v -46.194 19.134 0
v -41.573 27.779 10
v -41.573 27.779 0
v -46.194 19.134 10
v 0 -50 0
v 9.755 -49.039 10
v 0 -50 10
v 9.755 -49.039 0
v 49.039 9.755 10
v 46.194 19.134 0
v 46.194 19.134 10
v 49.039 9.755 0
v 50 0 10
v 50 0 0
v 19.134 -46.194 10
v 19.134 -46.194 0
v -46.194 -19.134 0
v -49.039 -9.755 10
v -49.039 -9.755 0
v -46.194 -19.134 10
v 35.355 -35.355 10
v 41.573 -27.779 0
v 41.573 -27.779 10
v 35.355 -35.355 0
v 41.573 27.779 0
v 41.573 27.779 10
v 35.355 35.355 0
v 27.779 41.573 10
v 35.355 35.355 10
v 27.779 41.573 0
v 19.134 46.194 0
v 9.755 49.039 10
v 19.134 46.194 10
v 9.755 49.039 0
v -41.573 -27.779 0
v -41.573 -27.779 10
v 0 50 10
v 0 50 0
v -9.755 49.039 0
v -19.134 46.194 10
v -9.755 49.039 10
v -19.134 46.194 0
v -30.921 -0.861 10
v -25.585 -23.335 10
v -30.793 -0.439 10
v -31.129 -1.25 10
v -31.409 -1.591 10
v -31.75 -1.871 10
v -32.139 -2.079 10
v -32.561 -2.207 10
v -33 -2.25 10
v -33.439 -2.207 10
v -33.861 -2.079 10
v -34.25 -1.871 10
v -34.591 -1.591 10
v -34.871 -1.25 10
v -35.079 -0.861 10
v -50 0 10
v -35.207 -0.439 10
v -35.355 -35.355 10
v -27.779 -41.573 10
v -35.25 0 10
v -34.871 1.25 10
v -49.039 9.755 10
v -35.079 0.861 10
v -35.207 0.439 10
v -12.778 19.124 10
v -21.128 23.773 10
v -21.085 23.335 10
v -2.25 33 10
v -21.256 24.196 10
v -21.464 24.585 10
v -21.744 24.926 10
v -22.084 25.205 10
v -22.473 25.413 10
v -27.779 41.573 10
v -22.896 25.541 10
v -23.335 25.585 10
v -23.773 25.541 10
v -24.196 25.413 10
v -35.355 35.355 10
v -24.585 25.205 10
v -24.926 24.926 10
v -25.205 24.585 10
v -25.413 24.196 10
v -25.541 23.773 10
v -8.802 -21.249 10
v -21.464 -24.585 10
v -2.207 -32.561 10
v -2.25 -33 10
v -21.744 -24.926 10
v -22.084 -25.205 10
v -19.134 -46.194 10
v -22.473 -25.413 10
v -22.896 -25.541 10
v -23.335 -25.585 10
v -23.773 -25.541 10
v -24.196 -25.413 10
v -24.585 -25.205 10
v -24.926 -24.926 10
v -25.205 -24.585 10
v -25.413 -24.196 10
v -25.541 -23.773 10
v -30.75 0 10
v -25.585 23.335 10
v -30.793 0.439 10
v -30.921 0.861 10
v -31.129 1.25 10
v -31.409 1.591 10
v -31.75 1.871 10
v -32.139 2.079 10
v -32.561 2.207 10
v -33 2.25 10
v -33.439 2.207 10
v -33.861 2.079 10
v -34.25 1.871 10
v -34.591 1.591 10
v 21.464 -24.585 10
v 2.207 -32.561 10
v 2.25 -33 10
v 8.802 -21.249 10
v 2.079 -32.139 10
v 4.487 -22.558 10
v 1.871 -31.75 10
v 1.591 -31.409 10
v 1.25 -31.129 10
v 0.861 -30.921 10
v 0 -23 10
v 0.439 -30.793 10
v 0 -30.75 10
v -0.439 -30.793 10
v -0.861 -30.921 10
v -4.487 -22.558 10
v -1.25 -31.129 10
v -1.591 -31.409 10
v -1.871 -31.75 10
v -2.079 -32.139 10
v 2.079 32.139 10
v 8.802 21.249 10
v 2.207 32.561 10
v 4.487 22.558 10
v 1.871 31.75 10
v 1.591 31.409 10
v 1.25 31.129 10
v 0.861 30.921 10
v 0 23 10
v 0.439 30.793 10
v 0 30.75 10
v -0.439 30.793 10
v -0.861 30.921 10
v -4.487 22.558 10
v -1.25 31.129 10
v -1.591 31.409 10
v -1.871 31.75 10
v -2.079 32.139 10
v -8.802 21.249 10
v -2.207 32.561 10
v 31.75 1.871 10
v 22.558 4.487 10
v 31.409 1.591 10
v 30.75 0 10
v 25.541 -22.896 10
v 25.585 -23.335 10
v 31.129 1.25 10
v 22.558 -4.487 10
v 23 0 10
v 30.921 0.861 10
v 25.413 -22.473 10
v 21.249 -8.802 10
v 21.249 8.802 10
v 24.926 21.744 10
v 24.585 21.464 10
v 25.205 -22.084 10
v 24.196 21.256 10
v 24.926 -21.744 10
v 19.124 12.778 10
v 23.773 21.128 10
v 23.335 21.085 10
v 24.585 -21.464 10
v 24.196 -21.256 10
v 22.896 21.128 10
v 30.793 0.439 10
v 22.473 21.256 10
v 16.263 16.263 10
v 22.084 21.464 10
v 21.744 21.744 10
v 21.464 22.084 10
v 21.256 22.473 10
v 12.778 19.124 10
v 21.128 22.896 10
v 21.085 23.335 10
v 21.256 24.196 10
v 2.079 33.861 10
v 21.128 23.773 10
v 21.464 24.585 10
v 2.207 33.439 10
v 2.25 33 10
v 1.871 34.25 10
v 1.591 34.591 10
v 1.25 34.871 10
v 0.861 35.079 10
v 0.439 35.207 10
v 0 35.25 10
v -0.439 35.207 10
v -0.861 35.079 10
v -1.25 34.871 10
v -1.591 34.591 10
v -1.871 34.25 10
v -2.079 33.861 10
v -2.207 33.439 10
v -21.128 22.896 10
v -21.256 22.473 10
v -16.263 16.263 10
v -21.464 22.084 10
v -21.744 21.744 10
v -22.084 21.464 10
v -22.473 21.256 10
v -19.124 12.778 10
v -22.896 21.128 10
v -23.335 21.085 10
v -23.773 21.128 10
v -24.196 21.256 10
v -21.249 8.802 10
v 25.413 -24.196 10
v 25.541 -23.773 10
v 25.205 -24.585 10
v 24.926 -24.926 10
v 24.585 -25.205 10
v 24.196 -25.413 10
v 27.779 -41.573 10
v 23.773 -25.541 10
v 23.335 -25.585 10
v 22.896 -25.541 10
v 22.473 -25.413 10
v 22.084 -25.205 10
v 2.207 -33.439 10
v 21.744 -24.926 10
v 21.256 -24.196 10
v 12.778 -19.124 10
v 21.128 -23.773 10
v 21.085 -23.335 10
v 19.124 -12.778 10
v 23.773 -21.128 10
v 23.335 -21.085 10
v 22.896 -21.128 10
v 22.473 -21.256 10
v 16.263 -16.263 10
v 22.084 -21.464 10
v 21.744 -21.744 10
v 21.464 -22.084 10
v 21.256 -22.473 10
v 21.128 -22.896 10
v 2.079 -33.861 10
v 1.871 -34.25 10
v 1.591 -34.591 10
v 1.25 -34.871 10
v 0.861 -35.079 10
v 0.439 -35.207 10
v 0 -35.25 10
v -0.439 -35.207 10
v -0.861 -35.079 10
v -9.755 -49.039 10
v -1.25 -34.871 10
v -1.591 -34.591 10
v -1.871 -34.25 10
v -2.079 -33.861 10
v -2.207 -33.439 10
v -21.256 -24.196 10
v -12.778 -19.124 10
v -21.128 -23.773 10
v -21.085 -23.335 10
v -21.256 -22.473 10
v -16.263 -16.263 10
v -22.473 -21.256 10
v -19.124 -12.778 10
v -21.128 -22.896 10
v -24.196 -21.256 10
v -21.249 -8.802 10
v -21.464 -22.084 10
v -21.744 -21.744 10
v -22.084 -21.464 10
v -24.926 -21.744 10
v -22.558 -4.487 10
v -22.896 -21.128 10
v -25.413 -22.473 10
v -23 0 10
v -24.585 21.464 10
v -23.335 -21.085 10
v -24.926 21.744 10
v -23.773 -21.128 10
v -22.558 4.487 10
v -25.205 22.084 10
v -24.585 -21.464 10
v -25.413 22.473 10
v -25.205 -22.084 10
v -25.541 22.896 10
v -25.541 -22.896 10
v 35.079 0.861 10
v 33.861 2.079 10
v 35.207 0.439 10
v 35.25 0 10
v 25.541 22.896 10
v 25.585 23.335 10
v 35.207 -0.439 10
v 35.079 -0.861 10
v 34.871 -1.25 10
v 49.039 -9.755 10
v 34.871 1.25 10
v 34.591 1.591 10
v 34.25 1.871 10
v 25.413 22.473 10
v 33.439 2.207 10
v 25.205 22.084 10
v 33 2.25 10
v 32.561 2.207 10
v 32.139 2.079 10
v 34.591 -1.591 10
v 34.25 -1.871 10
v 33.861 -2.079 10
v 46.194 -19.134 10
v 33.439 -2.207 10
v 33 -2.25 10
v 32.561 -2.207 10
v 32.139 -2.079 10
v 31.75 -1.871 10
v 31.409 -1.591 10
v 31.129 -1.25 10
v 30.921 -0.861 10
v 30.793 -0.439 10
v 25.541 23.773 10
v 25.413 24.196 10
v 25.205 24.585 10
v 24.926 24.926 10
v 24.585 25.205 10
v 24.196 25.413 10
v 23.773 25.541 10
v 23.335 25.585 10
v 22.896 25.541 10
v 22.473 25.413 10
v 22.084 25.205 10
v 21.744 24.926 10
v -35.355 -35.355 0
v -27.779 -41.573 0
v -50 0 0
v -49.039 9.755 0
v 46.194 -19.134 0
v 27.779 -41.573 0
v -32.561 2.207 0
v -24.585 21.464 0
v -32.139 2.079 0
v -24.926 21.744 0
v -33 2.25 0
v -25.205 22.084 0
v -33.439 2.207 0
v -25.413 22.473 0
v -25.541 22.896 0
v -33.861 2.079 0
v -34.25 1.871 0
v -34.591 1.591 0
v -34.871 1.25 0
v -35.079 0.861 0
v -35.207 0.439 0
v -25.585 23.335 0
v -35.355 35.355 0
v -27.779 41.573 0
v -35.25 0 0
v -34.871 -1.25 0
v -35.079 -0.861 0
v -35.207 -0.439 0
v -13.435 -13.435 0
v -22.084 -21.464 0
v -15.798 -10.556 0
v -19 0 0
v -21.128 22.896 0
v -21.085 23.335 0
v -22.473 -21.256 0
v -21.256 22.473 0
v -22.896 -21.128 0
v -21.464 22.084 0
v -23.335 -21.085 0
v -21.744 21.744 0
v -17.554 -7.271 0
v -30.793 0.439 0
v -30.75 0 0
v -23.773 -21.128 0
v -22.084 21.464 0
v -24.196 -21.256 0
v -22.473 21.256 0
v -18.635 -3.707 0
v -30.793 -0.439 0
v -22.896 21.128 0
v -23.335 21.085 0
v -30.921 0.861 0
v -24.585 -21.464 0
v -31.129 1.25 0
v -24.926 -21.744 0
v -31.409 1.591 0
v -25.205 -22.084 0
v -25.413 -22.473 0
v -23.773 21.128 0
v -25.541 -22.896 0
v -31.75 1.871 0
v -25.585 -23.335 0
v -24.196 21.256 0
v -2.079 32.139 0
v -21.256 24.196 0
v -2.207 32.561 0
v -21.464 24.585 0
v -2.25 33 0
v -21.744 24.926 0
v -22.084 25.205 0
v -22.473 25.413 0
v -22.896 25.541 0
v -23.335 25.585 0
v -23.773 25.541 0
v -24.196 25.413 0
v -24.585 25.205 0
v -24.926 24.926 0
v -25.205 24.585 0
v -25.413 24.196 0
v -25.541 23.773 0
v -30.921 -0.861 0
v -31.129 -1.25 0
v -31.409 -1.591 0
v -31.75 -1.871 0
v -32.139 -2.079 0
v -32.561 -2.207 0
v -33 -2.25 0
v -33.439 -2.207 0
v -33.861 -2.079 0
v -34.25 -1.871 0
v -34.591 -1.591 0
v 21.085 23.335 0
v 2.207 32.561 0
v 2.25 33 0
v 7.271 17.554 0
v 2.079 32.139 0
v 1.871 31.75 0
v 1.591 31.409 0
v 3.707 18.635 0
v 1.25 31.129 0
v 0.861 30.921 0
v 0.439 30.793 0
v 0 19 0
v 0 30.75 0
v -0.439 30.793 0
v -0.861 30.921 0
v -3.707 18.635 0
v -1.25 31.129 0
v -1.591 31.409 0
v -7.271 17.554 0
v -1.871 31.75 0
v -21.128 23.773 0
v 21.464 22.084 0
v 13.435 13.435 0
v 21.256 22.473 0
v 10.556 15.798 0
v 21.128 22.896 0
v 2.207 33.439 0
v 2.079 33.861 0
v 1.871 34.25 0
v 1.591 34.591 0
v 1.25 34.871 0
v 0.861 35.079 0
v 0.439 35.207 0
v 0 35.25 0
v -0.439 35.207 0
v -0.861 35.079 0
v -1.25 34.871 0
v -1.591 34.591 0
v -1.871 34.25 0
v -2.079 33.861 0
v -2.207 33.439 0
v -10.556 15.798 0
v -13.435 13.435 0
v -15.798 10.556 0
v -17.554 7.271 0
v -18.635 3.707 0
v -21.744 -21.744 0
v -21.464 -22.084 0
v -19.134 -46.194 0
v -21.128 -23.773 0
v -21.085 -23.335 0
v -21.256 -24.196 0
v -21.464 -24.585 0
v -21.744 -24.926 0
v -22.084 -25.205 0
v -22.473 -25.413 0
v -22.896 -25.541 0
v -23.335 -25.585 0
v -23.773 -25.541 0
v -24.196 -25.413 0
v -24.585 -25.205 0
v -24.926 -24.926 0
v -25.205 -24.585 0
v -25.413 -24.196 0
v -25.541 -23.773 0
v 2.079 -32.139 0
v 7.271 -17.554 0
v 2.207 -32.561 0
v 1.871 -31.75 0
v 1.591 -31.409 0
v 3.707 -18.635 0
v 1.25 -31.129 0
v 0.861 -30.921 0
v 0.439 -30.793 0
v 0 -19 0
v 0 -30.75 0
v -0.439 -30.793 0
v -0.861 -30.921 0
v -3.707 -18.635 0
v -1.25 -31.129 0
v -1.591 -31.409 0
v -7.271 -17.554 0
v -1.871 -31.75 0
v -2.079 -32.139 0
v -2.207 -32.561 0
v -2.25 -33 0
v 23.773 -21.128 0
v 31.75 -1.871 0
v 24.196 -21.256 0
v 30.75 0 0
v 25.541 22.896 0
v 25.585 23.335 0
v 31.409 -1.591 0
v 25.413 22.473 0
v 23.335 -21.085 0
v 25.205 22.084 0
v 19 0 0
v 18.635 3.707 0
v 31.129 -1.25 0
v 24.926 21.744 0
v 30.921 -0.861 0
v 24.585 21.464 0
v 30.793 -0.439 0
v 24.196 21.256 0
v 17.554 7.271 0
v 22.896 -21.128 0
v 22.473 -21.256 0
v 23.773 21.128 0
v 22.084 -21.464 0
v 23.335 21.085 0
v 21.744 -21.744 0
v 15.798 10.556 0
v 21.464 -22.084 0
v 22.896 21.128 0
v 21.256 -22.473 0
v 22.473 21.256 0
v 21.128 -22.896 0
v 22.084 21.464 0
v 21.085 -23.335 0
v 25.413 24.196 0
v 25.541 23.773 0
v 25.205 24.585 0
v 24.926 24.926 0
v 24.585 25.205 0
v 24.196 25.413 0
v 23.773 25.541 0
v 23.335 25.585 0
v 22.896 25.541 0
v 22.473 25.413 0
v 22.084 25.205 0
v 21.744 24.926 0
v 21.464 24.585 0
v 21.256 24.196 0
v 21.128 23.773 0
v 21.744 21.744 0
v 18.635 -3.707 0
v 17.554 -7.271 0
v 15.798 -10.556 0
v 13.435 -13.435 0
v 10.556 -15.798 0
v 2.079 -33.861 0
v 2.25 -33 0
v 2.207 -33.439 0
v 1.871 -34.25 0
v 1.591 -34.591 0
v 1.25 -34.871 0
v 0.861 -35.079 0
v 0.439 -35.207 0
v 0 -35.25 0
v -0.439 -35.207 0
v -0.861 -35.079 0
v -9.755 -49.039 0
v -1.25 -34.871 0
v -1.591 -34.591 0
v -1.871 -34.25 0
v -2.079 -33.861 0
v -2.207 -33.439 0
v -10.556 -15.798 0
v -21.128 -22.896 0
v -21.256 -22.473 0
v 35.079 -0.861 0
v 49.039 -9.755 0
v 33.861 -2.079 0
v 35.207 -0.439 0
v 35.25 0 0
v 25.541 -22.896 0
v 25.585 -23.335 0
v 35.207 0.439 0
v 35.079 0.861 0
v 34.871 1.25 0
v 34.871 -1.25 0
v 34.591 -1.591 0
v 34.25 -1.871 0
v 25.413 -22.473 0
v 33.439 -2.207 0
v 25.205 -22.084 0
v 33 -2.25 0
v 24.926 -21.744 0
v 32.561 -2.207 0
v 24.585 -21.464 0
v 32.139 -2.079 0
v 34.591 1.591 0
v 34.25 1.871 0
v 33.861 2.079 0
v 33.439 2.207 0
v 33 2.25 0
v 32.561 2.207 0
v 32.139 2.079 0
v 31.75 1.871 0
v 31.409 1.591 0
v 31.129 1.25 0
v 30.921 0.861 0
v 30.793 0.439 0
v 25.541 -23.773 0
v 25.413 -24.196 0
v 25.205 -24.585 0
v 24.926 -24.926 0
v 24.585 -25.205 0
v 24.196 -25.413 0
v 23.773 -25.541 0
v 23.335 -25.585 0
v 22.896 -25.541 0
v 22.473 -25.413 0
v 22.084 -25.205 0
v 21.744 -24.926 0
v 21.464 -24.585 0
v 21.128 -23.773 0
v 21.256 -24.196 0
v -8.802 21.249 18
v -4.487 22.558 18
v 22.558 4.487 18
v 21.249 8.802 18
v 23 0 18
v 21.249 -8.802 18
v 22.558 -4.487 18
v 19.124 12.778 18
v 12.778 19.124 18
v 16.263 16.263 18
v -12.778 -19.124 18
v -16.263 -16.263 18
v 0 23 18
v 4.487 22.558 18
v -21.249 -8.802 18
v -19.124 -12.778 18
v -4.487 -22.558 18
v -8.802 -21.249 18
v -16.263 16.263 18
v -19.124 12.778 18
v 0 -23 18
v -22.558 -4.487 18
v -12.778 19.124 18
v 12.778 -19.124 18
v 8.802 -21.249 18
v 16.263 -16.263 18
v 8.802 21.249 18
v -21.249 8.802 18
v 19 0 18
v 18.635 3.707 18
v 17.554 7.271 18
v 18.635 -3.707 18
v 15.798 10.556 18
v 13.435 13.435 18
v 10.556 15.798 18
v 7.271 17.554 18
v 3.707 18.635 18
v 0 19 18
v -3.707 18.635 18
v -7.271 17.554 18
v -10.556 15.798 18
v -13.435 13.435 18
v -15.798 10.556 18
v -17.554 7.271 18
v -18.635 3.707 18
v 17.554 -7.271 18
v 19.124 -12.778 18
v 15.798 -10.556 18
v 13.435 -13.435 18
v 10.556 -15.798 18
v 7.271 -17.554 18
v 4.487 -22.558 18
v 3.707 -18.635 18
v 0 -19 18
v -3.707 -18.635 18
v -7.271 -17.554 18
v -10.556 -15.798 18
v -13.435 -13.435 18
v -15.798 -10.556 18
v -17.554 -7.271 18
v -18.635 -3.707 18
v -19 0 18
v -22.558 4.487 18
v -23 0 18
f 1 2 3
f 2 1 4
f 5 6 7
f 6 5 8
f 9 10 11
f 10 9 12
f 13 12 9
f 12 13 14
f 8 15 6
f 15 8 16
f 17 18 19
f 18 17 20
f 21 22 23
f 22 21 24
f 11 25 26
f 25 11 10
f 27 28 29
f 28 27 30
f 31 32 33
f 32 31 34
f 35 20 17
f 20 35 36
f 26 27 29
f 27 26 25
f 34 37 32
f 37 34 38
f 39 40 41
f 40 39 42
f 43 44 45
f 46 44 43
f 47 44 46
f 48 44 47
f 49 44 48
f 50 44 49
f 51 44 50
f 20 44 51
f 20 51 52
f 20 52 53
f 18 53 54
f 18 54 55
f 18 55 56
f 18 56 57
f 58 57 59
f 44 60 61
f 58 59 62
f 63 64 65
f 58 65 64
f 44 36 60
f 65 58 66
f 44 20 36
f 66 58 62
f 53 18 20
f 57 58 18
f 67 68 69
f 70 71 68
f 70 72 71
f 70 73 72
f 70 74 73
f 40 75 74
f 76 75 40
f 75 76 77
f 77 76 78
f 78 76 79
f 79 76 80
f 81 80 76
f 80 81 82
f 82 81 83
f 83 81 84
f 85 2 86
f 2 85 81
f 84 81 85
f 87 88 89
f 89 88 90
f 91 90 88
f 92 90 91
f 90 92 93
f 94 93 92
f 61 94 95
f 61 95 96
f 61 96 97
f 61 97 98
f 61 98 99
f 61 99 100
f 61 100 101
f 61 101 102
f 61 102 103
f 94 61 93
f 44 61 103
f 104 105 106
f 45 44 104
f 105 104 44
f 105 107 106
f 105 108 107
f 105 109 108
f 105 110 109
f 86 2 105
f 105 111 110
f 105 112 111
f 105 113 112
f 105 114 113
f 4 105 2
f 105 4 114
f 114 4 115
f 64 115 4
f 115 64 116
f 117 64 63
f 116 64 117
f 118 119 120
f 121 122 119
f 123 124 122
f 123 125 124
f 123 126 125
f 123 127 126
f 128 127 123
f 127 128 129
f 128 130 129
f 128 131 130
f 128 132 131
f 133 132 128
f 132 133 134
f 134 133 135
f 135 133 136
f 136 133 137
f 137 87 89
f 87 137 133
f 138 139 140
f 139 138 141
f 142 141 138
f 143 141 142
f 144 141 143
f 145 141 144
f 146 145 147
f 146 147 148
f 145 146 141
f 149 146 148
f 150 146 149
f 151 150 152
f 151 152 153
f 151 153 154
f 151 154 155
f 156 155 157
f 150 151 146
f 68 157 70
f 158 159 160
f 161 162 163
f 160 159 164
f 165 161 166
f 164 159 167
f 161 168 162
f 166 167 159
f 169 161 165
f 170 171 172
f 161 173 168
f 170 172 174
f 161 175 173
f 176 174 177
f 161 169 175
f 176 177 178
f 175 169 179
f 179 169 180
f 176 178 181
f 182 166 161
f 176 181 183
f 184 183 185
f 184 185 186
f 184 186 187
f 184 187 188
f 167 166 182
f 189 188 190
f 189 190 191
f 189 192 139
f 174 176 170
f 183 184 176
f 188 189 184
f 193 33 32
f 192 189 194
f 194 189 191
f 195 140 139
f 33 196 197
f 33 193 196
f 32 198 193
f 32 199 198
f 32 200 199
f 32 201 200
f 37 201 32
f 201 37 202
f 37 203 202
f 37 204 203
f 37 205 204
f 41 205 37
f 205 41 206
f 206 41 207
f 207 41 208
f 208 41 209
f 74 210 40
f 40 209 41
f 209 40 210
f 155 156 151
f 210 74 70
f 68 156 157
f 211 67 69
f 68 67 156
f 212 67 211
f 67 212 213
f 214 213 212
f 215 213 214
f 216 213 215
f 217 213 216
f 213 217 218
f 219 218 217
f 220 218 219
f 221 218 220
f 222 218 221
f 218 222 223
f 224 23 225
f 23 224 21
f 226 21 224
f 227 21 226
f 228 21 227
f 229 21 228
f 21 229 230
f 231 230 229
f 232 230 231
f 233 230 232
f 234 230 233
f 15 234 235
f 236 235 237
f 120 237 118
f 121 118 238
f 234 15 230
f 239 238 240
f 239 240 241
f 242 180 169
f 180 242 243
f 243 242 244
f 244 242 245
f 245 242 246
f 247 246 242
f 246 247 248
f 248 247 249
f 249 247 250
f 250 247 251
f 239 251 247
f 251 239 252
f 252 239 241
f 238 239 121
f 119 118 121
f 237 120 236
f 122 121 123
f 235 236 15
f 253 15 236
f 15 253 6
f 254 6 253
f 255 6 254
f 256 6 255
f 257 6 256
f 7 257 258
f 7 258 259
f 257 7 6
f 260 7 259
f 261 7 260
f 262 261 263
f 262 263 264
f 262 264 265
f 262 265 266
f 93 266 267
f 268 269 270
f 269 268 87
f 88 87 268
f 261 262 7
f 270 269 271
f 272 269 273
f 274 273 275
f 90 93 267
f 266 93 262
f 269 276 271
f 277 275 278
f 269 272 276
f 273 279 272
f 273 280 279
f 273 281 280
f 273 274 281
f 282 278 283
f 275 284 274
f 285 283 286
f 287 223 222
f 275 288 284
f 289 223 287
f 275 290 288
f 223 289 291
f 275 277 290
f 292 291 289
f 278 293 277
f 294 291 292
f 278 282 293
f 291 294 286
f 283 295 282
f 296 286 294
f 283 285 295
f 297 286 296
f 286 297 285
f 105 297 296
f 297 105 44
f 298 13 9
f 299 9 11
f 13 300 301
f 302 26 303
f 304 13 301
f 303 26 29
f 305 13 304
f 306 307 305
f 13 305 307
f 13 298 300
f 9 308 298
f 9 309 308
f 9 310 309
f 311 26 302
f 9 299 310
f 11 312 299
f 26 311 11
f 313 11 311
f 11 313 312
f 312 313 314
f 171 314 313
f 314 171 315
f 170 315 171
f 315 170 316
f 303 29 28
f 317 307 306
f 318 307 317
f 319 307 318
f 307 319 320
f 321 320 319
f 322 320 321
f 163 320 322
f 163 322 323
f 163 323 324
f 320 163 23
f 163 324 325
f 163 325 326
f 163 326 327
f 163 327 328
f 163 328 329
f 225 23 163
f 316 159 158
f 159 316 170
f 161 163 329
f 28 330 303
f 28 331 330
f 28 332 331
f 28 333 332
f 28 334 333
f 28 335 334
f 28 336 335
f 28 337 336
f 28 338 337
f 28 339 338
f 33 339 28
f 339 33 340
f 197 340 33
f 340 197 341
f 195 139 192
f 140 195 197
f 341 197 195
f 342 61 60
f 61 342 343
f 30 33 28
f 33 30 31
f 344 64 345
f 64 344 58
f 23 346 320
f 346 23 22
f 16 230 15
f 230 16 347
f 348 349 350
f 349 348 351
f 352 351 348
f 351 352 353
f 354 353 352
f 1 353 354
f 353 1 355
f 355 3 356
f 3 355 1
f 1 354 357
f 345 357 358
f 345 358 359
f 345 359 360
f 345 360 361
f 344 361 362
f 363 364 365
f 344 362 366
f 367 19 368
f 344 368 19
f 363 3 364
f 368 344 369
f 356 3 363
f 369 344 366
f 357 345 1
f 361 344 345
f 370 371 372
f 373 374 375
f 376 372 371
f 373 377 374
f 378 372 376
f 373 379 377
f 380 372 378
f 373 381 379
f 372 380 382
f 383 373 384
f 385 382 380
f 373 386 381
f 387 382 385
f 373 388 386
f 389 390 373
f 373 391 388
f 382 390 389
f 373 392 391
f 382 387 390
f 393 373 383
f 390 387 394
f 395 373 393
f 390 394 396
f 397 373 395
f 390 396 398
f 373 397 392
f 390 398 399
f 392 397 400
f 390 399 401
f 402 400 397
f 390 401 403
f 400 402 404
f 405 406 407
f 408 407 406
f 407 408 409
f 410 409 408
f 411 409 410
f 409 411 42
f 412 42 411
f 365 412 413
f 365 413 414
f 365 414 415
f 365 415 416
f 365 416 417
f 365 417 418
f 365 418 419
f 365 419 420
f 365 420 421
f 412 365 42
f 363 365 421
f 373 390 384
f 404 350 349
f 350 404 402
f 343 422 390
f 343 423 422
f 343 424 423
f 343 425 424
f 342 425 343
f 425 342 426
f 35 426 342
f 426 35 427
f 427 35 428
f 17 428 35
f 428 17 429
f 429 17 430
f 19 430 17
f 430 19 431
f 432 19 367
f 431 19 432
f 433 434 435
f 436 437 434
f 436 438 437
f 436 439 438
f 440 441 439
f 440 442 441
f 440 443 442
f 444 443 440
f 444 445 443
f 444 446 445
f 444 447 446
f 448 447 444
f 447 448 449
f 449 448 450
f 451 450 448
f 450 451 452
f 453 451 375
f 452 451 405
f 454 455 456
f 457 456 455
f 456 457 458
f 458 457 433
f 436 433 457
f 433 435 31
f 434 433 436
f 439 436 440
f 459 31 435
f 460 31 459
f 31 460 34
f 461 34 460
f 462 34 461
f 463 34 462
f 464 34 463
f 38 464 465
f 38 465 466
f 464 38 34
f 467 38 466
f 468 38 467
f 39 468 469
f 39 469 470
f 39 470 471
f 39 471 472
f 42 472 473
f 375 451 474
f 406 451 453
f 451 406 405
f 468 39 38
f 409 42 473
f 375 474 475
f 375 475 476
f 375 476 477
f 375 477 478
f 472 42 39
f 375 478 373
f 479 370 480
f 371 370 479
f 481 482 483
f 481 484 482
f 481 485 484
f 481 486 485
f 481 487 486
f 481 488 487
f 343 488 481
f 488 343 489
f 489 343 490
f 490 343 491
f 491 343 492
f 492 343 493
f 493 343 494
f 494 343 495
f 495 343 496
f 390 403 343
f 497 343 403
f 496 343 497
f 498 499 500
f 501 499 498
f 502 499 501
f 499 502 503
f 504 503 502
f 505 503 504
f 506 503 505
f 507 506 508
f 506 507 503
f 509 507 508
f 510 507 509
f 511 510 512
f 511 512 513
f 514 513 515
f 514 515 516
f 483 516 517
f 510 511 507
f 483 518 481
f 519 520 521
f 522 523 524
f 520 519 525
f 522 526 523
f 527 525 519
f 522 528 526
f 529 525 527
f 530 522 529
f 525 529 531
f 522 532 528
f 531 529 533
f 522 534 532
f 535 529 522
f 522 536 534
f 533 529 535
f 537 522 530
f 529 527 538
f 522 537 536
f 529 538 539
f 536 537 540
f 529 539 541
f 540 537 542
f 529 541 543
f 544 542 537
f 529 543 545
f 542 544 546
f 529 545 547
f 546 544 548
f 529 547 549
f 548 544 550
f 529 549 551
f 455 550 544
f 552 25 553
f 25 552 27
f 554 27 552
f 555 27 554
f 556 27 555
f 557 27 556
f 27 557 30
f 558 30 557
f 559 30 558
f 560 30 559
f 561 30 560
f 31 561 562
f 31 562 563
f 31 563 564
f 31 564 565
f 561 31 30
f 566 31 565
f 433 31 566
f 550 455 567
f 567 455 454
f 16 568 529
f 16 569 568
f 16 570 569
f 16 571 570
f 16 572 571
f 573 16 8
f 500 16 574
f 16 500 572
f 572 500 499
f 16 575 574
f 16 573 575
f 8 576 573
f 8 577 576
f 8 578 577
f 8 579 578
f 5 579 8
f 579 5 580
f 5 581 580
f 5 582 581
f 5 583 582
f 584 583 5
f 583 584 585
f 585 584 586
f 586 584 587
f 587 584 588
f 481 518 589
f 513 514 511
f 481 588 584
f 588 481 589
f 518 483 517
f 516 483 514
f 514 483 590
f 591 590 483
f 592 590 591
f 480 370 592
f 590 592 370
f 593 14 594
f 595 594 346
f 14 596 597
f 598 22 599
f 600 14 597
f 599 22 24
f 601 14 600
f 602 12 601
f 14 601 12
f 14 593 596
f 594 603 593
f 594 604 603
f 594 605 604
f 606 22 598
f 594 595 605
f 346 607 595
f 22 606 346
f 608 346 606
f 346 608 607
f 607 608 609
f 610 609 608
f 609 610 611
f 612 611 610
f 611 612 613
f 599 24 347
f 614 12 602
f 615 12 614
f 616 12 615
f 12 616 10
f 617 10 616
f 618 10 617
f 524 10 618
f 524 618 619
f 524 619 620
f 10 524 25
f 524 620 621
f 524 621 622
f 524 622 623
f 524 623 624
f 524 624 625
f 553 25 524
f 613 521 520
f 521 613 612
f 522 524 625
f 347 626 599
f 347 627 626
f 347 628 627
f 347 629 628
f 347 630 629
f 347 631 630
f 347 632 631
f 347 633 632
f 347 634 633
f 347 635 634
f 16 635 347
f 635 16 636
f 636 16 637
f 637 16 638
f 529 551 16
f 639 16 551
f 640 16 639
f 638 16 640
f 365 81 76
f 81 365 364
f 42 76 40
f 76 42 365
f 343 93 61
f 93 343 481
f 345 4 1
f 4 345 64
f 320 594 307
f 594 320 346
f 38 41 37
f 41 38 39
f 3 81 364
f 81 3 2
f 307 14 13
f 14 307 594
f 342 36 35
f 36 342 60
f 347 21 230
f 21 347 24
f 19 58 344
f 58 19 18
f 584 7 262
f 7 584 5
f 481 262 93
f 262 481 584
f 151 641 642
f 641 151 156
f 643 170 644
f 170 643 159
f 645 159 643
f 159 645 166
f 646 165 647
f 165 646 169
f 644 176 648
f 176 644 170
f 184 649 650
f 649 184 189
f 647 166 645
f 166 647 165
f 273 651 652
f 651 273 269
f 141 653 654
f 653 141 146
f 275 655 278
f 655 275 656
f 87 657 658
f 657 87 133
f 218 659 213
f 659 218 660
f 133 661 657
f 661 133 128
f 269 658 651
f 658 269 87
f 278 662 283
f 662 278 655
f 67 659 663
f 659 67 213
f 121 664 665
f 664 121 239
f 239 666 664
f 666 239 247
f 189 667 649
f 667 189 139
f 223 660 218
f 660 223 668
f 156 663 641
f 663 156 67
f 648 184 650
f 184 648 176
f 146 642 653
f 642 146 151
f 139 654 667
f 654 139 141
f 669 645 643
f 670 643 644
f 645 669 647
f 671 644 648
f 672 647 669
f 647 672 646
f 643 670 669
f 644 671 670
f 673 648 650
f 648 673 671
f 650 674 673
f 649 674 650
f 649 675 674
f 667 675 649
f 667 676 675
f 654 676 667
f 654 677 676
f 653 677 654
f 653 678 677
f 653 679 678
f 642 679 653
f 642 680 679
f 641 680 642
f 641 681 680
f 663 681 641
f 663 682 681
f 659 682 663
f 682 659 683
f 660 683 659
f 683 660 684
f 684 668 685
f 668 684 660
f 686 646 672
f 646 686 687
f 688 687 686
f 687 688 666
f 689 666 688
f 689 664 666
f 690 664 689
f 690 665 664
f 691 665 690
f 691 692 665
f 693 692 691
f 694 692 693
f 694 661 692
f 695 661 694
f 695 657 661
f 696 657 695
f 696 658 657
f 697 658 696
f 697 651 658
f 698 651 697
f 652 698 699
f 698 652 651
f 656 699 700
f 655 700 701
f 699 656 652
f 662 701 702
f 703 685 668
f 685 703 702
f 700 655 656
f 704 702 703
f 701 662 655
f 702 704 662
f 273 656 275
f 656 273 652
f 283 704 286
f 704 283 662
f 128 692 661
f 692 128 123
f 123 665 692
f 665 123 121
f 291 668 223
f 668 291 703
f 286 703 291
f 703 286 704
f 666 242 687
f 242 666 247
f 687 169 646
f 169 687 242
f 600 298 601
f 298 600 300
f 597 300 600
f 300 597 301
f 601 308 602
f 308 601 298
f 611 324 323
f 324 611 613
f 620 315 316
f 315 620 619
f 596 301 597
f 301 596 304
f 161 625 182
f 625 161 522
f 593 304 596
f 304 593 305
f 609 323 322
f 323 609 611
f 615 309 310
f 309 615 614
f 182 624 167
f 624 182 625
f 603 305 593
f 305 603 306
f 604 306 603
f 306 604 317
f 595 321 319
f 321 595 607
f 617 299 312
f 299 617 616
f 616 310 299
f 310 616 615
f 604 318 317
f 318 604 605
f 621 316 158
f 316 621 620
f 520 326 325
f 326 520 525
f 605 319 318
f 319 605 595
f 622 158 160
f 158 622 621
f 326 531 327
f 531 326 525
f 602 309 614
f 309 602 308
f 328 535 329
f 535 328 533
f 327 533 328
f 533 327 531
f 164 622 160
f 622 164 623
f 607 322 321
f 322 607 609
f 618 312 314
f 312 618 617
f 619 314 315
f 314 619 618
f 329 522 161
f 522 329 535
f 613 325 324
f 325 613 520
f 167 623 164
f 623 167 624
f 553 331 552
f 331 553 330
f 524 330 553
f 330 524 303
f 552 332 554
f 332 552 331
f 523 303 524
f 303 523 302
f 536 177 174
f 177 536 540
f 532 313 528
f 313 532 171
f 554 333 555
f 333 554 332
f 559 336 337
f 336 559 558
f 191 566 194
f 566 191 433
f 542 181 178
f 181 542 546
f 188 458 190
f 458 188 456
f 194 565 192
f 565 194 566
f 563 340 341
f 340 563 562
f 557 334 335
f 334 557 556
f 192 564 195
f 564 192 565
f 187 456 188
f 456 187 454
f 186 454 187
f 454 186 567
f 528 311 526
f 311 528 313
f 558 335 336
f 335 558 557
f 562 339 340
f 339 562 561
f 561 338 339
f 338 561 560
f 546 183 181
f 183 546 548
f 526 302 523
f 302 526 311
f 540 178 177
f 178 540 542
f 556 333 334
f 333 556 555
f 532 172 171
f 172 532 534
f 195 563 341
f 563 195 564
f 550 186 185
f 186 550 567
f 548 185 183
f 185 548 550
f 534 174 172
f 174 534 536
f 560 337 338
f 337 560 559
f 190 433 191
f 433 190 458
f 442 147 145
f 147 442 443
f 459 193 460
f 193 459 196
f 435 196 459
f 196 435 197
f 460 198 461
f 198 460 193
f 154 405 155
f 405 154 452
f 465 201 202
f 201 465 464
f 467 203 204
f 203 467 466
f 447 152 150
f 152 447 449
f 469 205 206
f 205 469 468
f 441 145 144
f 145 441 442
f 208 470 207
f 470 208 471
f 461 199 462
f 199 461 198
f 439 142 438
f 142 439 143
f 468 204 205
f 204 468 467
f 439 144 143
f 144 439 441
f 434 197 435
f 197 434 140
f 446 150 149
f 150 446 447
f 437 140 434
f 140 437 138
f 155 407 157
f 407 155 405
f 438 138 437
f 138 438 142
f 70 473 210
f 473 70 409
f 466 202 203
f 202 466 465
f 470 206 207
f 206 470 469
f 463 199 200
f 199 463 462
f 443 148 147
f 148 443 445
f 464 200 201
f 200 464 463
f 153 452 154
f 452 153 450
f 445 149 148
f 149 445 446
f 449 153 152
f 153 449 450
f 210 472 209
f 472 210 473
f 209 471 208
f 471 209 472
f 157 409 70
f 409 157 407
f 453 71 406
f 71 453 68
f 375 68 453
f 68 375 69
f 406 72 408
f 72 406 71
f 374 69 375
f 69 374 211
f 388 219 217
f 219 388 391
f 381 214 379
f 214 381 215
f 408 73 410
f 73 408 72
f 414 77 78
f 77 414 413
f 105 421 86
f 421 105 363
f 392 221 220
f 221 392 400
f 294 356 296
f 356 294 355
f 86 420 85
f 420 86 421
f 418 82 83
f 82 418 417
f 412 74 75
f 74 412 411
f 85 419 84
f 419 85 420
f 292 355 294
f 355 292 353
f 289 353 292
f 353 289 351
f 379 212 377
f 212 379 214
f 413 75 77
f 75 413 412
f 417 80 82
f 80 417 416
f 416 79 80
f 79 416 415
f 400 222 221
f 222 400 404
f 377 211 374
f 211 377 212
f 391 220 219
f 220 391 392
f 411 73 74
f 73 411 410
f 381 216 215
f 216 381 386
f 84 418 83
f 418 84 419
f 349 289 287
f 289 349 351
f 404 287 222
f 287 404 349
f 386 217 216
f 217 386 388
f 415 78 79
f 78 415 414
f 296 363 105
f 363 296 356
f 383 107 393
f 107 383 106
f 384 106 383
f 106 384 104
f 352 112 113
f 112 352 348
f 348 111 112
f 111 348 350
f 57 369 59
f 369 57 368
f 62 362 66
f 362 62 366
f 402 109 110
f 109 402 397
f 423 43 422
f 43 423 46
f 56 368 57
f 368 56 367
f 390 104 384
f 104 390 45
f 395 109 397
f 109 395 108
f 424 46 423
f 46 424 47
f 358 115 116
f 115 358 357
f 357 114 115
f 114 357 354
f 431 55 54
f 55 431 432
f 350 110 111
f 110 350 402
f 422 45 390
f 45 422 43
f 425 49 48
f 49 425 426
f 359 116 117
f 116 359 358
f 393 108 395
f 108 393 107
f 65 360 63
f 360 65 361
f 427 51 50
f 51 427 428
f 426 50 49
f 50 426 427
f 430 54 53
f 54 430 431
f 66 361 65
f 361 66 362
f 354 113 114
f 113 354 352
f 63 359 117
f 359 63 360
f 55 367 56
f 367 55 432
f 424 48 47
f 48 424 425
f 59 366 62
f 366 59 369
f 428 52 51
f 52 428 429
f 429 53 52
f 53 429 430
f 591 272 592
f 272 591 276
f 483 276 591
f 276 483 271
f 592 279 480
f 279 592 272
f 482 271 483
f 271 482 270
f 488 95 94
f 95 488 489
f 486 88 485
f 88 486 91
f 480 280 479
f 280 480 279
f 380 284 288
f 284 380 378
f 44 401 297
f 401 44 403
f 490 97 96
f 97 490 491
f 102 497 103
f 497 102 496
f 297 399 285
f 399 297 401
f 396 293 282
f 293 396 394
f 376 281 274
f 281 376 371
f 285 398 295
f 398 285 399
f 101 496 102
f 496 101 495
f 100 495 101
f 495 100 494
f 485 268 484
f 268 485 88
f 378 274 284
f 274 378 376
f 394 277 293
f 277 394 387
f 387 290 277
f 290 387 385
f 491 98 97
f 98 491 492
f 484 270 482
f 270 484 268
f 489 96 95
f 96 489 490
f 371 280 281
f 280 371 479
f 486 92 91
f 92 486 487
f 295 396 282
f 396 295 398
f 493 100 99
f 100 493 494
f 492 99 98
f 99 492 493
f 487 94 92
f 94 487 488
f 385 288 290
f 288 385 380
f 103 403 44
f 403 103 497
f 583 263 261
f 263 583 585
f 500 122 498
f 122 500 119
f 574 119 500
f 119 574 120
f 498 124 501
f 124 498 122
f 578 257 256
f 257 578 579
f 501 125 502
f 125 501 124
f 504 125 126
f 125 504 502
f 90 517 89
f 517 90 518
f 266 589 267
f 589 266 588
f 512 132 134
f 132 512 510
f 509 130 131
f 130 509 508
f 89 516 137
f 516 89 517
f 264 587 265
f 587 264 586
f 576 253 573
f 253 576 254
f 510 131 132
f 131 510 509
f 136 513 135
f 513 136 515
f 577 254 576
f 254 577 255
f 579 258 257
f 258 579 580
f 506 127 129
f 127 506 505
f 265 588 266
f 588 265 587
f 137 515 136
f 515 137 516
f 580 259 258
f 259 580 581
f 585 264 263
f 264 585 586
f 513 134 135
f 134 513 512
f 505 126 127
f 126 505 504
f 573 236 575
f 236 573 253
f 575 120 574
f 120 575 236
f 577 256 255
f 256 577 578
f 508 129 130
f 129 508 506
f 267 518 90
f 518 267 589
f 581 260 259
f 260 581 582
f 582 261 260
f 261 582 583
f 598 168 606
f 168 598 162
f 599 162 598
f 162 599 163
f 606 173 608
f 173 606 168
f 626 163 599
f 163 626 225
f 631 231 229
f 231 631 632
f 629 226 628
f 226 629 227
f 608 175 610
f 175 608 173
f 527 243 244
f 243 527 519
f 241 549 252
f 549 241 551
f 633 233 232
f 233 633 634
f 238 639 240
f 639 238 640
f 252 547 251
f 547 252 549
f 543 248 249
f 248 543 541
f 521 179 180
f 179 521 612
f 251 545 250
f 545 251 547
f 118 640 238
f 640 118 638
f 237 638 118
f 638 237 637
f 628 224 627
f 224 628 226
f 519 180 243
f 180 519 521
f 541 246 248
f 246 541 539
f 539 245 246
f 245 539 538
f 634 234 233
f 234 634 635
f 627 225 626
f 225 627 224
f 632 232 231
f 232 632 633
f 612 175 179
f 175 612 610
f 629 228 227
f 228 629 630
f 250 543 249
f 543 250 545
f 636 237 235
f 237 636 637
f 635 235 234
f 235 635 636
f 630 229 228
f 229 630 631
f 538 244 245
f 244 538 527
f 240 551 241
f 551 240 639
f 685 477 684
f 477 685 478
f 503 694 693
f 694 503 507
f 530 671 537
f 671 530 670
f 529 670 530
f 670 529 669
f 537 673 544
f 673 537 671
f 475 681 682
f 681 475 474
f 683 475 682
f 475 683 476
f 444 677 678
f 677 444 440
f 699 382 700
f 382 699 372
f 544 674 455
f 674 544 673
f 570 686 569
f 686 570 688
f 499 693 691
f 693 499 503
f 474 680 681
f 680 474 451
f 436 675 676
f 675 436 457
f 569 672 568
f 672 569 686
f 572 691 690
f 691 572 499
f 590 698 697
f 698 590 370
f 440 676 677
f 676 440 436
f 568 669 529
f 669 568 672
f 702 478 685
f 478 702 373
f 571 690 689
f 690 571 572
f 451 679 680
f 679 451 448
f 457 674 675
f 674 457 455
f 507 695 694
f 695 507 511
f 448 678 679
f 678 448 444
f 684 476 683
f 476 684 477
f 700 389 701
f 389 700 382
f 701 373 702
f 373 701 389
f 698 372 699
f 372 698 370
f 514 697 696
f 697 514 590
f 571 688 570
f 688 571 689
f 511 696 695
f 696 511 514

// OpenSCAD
$fn = 32;

// ----------------------------------------------------------------------
// Flange Ø100 x 10
// 8 holes on a Ø66 bolt circle, bolted joints
// ----------------------------------------------------------------------

// --- parameters (mm) ---
flange_d = 100;  // outside diameter of the flange
thickness = 10;  // flange thickness
holes = 8;       // number of bolt holes
pcd = 66;        // bolt circle diameter
start_deg = 0;   // angle of the first hole, from +X
hole_d = 4.5;    // bolt hole diameter
bore_d = 38;     // central through bore
hub_d = 46;      // hub outside diameter
hub_h = 8;       // hub height above the flange face (0 = no hub)

// --- derived feature positions (mm) ---
height = thickness + hub_h;  // = 18   overall height of the part
pcd_r = pcd / 2;             // = 33   bolt circle radius
hole_step = 360 / holes;     // = 45   angular pitch
feature_centers = [
  [pcd_r * cos(start_deg + 0 * hole_step), pcd_r * sin(start_deg + 0 * hole_step)],
  [pcd_r * cos(start_deg + 1 * hole_step), pcd_r * sin(start_deg + 1 * hole_step)],
  [pcd_r * cos(start_deg + 2 * hole_step), pcd_r * sin(start_deg + 2 * hole_step)],
  [pcd_r * cos(start_deg + 3 * hole_step), pcd_r * sin(start_deg + 3 * hole_step)],
  [pcd_r * cos(start_deg + 4 * hole_step), pcd_r * sin(start_deg + 4 * hole_step)],
  [pcd_r * cos(start_deg + 5 * hole_step), pcd_r * sin(start_deg + 5 * hole_step)],
  [pcd_r * cos(start_deg + 6 * hole_step), pcd_r * sin(start_deg + 6 * hole_step)],
  [pcd_r * cos(start_deg + 7 * hole_step), pcd_r * sin(start_deg + 7 * hole_step)]
];   // bolt hole centres on the pitch circle

// flange disc, every hole and the bore cut straight through
difference() {
  union() {
    cylinder(d = flange_d, h = thickness);
    cylinder(d = hub_d, h = height);  // hub, overlapped into the flange
  }
  translate([0, 0, -1]) cylinder(d = bore_d, h = height + 2);  // bore, through
  for (centre = feature_centers)
    translate([centre[0], centre[1], -1]) cylinder(d = hole_d, h = thickness + 2);
}
